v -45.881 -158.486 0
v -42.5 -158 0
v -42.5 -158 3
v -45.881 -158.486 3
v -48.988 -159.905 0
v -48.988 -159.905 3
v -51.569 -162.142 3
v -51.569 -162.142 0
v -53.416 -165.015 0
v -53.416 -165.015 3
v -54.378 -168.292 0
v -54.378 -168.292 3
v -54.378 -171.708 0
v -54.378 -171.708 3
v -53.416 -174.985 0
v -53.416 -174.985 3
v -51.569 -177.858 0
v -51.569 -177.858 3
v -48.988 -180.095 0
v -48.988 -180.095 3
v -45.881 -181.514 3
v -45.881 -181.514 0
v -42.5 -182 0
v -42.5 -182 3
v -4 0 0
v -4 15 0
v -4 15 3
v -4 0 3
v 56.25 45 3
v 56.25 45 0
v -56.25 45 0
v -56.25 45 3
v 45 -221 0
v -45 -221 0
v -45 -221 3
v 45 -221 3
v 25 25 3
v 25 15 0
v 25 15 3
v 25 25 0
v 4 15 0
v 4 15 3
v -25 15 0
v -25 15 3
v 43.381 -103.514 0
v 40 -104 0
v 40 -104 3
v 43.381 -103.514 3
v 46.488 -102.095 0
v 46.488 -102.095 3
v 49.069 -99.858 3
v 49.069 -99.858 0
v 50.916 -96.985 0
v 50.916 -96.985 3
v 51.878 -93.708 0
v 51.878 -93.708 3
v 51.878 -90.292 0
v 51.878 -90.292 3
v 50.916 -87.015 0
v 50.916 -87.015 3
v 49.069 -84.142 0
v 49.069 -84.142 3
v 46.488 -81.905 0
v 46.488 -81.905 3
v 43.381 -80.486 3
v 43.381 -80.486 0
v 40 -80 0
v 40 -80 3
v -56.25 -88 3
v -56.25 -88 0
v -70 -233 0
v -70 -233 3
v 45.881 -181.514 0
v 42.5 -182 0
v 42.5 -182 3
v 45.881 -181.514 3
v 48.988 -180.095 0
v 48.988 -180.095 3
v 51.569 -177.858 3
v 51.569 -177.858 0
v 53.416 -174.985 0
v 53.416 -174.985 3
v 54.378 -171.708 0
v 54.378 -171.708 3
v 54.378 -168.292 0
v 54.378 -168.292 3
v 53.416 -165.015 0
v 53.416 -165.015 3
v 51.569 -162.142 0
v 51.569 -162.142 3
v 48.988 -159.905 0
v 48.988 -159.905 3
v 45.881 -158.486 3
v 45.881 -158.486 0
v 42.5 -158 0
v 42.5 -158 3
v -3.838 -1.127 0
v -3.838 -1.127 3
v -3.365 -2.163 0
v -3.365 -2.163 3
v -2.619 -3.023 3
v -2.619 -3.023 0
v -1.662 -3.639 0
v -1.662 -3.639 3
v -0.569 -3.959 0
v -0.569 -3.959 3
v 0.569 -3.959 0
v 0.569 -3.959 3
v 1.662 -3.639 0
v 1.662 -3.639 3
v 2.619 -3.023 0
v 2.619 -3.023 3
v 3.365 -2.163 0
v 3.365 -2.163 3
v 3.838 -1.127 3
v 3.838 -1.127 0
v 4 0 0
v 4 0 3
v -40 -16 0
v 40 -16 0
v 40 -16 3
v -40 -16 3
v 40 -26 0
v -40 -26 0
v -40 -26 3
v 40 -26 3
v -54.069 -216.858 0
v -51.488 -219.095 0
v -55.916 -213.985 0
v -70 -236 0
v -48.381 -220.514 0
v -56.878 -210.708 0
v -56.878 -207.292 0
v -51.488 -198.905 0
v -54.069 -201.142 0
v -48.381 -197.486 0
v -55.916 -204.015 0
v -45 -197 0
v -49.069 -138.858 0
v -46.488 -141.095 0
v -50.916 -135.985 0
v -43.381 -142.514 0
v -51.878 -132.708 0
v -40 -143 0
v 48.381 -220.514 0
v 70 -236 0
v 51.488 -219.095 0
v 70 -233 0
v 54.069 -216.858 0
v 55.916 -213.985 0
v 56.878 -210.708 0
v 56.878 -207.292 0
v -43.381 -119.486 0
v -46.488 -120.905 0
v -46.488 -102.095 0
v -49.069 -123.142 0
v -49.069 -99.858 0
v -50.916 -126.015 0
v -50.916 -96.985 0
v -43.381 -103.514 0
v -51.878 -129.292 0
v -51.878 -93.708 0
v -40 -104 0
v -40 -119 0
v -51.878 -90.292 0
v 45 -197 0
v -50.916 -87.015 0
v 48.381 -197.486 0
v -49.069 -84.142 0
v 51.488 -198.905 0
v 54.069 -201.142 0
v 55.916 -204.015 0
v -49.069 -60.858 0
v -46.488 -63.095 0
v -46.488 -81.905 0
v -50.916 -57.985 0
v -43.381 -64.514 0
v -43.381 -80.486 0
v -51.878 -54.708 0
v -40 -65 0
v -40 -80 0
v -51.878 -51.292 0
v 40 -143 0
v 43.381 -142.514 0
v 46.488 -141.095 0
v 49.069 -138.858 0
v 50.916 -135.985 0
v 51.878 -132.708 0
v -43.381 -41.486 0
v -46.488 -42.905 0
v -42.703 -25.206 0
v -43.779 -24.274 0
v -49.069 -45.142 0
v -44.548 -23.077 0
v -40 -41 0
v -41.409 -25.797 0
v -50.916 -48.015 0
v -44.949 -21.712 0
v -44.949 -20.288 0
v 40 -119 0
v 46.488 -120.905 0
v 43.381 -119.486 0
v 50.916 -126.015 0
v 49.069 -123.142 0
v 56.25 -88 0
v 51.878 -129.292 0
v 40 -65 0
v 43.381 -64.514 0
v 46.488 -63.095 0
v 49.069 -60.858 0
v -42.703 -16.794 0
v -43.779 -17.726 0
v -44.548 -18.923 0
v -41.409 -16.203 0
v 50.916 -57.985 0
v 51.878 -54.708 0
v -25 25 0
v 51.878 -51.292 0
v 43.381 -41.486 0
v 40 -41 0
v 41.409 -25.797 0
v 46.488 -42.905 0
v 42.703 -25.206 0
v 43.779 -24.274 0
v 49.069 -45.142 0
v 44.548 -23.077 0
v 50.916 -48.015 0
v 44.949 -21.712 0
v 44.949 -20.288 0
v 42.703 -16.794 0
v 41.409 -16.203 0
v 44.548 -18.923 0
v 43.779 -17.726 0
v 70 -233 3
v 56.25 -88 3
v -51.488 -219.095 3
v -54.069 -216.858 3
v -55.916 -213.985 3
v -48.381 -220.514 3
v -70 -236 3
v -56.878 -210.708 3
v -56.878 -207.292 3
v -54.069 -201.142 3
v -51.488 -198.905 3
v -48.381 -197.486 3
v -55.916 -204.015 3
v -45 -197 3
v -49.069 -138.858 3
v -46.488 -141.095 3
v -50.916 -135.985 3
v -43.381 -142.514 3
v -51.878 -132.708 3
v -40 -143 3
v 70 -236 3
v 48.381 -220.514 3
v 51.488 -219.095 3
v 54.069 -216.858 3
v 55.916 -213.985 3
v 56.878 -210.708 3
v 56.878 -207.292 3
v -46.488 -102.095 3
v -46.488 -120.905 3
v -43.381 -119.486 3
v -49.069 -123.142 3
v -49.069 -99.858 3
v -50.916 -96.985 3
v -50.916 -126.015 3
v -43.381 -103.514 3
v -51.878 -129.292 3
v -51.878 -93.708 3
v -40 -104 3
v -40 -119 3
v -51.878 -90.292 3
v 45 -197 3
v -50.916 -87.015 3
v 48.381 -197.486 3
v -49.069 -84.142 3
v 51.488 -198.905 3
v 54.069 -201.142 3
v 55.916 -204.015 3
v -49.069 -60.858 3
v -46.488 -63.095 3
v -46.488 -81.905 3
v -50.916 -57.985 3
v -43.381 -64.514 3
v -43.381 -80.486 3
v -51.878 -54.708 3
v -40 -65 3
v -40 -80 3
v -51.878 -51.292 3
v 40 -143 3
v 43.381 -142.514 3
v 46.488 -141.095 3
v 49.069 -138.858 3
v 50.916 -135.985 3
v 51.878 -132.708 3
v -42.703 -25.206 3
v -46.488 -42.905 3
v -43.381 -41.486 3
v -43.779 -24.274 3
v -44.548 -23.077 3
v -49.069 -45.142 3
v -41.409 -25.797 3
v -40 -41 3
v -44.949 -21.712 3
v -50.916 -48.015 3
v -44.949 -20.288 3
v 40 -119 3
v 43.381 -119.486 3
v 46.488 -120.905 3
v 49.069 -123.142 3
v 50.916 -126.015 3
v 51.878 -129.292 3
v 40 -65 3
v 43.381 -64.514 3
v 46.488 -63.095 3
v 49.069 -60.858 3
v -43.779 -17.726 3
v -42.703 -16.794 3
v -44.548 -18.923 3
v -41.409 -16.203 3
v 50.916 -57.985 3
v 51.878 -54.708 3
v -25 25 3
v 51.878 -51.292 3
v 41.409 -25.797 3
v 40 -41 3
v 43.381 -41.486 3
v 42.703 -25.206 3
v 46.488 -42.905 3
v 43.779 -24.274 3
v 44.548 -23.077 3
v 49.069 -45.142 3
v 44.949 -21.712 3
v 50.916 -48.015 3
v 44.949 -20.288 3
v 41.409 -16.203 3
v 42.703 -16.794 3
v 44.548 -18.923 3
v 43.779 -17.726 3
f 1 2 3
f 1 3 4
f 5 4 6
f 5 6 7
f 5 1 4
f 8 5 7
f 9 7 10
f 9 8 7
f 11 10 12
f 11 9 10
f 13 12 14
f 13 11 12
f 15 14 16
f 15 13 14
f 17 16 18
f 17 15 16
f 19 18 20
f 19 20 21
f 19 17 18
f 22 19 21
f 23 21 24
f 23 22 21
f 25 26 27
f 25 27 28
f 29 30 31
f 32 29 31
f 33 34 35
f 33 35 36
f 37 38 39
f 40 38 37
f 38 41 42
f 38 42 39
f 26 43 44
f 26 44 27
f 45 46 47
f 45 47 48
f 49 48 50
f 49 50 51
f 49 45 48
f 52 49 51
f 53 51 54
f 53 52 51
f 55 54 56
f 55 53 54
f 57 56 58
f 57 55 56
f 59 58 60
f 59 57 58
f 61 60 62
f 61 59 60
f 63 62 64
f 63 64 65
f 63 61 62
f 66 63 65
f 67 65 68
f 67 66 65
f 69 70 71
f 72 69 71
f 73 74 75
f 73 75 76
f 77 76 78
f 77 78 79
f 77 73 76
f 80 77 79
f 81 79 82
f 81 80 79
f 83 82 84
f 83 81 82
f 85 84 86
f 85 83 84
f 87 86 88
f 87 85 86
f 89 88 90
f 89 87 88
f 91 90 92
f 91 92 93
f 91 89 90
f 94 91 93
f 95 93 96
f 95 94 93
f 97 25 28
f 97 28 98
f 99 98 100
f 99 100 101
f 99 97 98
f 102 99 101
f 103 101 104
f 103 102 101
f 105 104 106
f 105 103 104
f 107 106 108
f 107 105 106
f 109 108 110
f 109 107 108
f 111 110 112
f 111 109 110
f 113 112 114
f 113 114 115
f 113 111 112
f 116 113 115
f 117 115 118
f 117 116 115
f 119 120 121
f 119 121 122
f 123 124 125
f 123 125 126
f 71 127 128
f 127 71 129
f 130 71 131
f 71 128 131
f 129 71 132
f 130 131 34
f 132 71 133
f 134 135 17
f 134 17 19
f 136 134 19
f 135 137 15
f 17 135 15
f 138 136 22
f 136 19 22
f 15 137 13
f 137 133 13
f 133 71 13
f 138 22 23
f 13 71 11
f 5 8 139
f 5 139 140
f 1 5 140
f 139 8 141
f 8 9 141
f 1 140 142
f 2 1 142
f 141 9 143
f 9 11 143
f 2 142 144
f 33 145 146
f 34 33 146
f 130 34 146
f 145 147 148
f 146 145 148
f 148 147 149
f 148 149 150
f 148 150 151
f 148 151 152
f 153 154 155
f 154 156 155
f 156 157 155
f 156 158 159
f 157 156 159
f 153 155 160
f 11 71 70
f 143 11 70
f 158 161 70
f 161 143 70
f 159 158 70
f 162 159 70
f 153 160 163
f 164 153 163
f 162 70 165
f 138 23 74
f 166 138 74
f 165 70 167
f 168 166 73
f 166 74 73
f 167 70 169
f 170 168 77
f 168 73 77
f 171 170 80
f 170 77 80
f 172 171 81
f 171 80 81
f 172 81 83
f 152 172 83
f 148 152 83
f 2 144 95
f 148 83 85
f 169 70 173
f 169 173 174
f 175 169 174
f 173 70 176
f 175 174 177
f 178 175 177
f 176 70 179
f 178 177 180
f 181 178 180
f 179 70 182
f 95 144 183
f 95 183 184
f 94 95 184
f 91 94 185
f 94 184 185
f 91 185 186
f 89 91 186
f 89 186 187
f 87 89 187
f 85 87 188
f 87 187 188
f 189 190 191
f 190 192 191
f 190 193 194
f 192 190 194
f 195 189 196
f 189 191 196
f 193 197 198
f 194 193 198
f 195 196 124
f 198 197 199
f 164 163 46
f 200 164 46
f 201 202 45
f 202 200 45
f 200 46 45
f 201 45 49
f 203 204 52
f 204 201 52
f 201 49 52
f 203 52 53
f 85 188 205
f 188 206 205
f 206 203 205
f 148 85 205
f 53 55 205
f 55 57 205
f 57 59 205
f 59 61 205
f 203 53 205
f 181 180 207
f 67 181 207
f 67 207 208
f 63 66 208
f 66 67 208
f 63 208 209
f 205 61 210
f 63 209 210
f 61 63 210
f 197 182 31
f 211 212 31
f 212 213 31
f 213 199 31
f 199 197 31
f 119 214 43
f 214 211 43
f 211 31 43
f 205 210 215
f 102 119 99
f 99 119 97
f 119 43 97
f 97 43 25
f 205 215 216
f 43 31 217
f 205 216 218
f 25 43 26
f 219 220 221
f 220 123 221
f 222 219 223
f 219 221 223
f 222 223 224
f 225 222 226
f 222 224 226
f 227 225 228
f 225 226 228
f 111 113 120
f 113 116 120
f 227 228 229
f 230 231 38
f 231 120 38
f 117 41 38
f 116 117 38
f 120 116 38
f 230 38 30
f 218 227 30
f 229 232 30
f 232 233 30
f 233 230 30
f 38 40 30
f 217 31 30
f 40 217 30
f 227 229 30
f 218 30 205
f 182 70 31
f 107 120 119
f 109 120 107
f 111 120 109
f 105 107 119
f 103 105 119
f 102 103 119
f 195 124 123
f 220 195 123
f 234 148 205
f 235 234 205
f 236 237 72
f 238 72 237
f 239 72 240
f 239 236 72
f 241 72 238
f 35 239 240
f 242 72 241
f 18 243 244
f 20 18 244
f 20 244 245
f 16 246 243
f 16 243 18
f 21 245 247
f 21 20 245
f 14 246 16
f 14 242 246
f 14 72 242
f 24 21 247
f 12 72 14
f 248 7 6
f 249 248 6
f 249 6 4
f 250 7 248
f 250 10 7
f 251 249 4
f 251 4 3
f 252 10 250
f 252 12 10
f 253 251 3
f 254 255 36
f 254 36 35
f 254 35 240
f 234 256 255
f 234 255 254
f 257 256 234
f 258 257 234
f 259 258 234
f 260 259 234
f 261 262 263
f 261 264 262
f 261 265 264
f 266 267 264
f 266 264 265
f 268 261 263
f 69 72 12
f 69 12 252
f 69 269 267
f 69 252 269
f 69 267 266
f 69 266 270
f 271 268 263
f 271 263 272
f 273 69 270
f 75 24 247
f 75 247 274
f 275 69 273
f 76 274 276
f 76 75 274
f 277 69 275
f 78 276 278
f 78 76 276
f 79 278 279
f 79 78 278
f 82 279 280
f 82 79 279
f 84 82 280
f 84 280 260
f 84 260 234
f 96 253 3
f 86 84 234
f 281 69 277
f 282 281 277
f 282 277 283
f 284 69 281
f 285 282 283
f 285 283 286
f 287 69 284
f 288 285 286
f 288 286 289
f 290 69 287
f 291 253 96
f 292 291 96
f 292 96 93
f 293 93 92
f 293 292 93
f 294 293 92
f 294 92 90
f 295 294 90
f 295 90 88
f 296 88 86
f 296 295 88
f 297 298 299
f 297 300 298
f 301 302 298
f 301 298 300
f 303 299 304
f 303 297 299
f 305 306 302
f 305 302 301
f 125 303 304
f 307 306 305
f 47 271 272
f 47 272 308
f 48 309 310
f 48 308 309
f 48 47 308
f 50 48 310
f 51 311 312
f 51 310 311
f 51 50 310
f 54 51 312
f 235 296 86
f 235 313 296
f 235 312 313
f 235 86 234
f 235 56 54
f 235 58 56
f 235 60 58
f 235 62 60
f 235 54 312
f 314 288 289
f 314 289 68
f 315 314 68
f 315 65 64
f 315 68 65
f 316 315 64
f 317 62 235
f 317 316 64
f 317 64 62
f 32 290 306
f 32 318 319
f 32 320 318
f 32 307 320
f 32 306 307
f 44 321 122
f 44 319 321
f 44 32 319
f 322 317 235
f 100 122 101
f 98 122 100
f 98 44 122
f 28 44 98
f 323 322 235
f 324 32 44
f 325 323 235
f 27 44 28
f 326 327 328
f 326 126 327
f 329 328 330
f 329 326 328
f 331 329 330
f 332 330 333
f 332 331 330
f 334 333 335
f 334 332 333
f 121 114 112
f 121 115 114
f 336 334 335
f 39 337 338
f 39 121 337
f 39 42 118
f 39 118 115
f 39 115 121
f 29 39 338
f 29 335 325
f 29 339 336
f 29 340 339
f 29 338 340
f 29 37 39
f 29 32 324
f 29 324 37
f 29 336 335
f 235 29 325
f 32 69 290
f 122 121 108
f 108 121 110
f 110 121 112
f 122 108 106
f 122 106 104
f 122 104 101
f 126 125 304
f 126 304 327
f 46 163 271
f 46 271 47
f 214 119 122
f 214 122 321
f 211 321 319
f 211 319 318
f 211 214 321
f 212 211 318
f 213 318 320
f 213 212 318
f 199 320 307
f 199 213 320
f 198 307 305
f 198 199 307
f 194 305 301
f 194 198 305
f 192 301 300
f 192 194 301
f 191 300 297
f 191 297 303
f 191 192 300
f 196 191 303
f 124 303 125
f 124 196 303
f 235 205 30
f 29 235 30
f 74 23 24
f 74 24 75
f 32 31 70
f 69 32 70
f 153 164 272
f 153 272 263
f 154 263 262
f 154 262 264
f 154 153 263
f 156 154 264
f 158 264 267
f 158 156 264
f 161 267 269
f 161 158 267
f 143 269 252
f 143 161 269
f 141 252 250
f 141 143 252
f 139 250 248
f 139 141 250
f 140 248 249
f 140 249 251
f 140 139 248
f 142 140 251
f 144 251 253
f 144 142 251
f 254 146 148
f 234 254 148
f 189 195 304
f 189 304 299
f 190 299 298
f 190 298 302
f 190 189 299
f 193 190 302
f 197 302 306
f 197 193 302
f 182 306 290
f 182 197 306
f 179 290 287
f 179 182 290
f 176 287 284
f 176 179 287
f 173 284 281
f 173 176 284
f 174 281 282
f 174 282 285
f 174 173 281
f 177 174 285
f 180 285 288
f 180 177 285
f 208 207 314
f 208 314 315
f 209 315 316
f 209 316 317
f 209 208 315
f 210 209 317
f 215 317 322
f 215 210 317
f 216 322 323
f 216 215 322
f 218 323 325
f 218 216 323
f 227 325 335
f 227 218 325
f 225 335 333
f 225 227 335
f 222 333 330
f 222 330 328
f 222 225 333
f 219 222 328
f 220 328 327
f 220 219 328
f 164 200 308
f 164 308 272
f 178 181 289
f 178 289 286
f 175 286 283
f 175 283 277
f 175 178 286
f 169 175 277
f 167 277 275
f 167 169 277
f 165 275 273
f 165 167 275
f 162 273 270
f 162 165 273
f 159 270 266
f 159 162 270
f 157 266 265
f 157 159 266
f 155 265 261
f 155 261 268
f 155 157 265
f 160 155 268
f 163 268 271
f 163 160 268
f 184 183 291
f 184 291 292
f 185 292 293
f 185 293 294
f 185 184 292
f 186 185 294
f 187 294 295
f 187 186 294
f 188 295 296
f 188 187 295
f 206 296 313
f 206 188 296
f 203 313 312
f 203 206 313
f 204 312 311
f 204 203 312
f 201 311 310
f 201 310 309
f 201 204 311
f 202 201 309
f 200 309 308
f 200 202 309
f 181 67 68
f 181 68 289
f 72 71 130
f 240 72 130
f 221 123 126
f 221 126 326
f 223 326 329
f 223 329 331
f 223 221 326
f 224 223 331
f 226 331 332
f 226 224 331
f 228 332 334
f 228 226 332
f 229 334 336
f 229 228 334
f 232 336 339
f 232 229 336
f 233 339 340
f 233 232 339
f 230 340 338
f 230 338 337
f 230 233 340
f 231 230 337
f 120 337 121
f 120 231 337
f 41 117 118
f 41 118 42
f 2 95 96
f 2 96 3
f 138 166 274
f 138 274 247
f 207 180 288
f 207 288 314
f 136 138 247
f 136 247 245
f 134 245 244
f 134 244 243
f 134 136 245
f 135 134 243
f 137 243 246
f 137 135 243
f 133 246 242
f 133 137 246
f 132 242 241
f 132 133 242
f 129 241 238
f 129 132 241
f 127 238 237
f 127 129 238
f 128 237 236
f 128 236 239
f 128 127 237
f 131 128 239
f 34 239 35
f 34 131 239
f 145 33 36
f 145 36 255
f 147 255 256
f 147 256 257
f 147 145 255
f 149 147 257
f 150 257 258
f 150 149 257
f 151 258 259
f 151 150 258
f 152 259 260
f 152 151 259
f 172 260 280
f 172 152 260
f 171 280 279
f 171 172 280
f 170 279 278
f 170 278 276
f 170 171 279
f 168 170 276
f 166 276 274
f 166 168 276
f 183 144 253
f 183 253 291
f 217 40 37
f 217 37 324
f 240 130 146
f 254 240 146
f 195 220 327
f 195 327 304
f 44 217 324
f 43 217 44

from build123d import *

# Parameters (mm, degrees)
BOSS_EXTRUDE1_DEPTH = 3


with BuildPart() as part:
    # Sketch1 → Boss-Extrude1 (new body)
    with BuildSketch(Plane.XY):
        Polygon((-70, -236), (70, -236), (70, -233), (56.25, -88), (56.25, 45), (-56.25, 45), (-56.25, -88), (-70, -233), align=None)
        with BuildLine():
            Line((40, -16), (-40, -16))
            ThreePointArc((-40, -16), (-45, -21), (-40, -26))
            Line((-40, -26), (40, -26))
            ThreePointArc((40, -26), (45, -21), (40, -16))
        make_face(mode=Mode.SUBTRACT)
        with BuildLine():
            Line((25, 15), (25, 25))
            Line((25, 25), (-25, 25))
            Line((-25, 25), (-25, 15))
            Line((-25, 15), (-4, 15))
            Line((-4, 15), (-4, 0))
            ThreePointArc((-4, 0), (0, -4), (4, 0))
            Line((4, 0), (4, 15))
            Line((4, 15), (25, 15))
        make_face(mode=Mode.SUBTRACT)
        with BuildLine():
            Line((40, -41), (-40, -41))
            ThreePointArc((-40, -41), (-52, -53), (-40, -65))
            Line((-40, -65), (40, -65))
            ThreePointArc((40, -65), (52, -53), (40, -41))
        make_face(mode=Mode.SUBTRACT)
        with BuildLine():
            Line((40, -80), (-40, -80))
            ThreePointArc((-40, -80), (-52, -92), (-40, -104))
            Line((-40, -104), (40, -104))
            ThreePointArc((40, -104), (52, -92), (40, -80))
        make_face(mode=Mode.SUBTRACT)
        with BuildLine():
            Line((40, -119), (-40, -119))
            ThreePointArc((-40, -119), (-52, -131), (-40, -143))
            Line((-40, -143), (40, -143))
            ThreePointArc((40, -143), (52, -131), (40, -119))
        make_face(mode=Mode.SUBTRACT)
        with BuildLine():
            Line((42.5, -158), (-42.5, -158))
            ThreePointArc((-42.5, -158), (-54.5, -170), (-42.5, -182))
            Line((-42.5, -182), (42.5, -182))
            ThreePointArc((42.5, -182), (54.5, -170), (42.5, -158))
        make_face(mode=Mode.SUBTRACT)
        with BuildLine():
            Line((45, -197), (-45, -197))
            ThreePointArc((-45, -197), (-57, -209), (-45, -221))
            Line((-45, -221), (45, -221))
            ThreePointArc((45, -221), (57, -209), (45, -197))
        make_face(mode=Mode.SUBTRACT)
    extrude(amount=BOSS_EXTRUDE1_DEPTH)


solid = part.part
